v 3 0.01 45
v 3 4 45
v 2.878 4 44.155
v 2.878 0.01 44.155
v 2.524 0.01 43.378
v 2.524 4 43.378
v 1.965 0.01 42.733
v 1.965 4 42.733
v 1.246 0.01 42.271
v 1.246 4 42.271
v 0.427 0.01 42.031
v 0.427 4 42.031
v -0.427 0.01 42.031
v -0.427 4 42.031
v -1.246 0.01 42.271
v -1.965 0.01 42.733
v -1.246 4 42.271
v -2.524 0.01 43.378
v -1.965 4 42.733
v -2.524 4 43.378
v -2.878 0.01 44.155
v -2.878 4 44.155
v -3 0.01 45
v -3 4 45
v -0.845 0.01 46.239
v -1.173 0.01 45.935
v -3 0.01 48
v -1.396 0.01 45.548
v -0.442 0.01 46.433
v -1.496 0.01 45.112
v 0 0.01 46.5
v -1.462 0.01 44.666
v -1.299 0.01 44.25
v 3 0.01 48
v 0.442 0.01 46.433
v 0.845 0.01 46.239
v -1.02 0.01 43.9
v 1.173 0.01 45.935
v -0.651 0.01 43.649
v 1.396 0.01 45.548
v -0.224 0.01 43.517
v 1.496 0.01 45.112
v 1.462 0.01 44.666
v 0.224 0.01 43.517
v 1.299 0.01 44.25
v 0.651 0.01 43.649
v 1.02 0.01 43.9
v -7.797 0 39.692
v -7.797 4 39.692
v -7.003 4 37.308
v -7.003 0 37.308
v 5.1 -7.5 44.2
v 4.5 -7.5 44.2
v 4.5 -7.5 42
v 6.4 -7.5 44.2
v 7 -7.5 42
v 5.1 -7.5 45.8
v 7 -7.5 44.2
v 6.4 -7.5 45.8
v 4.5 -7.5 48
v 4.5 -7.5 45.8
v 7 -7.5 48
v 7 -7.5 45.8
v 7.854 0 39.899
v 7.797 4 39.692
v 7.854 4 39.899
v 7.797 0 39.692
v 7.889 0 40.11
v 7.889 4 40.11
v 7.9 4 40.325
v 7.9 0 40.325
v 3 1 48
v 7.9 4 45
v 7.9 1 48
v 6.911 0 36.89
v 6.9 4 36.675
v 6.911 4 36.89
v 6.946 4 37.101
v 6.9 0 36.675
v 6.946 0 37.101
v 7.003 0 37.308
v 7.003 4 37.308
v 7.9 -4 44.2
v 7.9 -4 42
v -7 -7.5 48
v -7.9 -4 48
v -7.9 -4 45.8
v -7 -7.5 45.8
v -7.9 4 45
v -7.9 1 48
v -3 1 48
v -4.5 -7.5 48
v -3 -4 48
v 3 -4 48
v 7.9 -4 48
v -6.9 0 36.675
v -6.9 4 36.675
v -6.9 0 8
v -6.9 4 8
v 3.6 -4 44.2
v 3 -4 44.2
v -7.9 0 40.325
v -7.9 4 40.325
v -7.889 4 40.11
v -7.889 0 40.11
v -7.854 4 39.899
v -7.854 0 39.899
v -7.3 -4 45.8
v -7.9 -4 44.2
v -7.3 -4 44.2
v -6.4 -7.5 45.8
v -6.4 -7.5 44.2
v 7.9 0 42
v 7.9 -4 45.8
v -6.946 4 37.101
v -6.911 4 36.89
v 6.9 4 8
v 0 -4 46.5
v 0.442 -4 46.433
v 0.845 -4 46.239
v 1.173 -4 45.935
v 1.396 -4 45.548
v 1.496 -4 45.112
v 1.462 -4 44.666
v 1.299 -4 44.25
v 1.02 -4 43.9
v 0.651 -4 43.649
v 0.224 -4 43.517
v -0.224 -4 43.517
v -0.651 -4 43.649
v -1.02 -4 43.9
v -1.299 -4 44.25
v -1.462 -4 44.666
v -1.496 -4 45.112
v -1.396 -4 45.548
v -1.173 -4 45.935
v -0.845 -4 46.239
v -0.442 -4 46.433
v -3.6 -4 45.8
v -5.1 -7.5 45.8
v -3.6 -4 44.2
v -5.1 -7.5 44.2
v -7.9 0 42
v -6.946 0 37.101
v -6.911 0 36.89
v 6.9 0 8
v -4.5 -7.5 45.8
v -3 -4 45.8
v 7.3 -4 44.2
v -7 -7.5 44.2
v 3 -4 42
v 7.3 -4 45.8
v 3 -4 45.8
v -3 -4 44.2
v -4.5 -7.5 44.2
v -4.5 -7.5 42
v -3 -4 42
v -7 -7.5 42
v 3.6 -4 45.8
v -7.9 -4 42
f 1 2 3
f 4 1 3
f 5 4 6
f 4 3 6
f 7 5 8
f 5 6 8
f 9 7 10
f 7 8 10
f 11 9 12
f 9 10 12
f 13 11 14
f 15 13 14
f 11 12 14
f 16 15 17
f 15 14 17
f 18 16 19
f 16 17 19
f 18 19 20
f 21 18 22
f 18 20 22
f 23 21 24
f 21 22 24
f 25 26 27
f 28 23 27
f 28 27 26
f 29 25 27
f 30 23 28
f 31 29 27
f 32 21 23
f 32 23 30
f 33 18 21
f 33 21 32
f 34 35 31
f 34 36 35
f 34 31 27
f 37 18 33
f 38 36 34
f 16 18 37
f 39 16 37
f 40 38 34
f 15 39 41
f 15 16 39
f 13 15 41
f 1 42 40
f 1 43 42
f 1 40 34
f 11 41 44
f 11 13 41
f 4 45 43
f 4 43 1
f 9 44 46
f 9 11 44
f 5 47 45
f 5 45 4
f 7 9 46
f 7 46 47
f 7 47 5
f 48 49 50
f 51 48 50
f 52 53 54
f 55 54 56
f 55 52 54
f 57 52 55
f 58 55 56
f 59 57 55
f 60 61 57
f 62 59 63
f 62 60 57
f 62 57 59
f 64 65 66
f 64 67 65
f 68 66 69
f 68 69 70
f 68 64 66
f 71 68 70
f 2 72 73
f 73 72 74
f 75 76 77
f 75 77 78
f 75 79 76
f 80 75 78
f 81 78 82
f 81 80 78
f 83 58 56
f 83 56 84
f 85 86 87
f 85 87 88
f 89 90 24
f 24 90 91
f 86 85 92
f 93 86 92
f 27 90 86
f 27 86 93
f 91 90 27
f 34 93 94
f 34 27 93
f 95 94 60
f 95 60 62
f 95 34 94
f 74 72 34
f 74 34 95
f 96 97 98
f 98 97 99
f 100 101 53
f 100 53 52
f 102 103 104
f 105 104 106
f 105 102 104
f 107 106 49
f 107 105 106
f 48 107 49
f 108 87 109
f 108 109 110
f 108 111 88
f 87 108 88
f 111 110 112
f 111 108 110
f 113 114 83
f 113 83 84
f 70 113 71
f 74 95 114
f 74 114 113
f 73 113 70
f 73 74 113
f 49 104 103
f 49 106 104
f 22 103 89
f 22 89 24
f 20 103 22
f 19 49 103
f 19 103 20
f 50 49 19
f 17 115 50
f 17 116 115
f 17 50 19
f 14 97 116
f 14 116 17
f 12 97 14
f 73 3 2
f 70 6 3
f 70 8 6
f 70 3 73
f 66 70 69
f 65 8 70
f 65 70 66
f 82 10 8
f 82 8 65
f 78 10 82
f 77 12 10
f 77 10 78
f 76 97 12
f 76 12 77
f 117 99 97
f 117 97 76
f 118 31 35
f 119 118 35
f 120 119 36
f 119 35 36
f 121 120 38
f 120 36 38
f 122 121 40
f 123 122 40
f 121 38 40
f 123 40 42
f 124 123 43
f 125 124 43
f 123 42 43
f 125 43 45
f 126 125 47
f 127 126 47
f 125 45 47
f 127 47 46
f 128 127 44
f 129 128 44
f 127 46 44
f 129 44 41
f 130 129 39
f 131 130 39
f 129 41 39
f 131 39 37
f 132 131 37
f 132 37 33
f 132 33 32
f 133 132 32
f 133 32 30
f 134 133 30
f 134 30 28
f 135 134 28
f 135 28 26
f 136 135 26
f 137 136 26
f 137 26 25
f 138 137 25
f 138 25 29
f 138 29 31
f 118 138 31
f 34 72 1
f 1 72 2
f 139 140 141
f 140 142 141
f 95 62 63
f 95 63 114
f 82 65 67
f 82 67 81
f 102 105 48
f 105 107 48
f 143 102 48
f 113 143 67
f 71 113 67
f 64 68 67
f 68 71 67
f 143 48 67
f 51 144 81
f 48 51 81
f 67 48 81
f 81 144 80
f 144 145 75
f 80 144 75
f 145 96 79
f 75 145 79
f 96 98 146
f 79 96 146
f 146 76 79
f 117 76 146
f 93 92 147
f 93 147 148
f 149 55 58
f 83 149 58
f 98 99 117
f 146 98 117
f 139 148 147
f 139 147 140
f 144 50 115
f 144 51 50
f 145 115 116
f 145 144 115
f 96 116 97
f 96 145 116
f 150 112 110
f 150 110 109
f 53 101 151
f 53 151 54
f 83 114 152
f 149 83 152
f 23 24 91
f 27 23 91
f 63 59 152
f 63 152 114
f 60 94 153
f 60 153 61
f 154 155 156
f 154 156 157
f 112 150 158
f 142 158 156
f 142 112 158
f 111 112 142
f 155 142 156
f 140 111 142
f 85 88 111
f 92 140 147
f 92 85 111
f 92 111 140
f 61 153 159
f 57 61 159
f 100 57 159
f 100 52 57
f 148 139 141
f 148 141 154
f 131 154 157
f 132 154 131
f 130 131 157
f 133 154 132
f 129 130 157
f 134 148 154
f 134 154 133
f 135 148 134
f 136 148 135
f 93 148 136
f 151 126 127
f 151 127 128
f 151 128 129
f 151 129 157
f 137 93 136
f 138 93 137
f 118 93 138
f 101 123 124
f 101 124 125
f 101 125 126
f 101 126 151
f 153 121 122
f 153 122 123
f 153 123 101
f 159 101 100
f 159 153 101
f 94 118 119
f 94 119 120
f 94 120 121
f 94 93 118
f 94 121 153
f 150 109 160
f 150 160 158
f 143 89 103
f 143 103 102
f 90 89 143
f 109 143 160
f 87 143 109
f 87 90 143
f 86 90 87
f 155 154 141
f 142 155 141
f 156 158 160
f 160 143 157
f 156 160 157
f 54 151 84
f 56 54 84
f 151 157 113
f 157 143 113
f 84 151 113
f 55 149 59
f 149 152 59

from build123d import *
from build123d.topology import SkipClean

# Parameters (mm, degrees)
EXTRUDE_1_DEPTH     = 4
EXTRUDE_3_DEPTH     = 6
CHAMFER_1_SIZE      = 3
CUT_EXTRUDE_2_DEPTH = 3.99
CUT_EXTRUDE_3_REACH = 51.222
SKETCH_7_R          = 1.5
SKETCH_8_R          = 6
EXTRUDE_4_DEPTH     = 1
FILLET_1_R          = 0.5
SKETCH_9_R          = 5
CUT_EXTRUDE_4_DEPTH = 3
SKETCH_10_R         = 3.55
CUT_EXTRUDE_5_DEPTH = 3.6
CUT_EXTRUDE_6_DEPTH = 0.8
CUT_EXTRUDE_7_DEPTH = 50.986598204
FILLET_2_R          = 2


with BuildPart() as part:
    # ｽｹｯﾁ1 → ﾎﾞｽ - 押し出し1 (new body)
    with BuildSketch(Plane(origin=(0, 0, 0), x_dir=(1, 0, 0), z_dir=(0, 1, 0))):
        with BuildLine():
            Line((-7.9, 0), (-7.9, -48))
            Line((-7.9, -48), (7.9, -48))
            Line((7.9, -48), (7.9, 0))
            ThreePointArc((7.9, 0), (0, 7.9), (-7.9, 0))
        make_face()
    extrude(amount=EXTRUDE_1_DEPTH)

    # ｽｹｯﾁ4 → ﾎﾞｽ - 押し出し3 (add)
    with BuildSketch(Plane.XY.offset(48)):
        Polygon((-7, -7.5), (-4.5, -7.5), (-3, -4), (3, -4), (4.5, -7.5), (7, -7.5), (7.9, -4), (7.9, 0), (-7.9, 0), (-7.9, -4), align=None)
    extrude(amount=-EXTRUDE_3_DEPTH)

    # 面取り1
    chamfer_1_edges = [part.edges().sort_by_distance(p)[0] for p in [
        (0, 4, 48),
    ]]
    chamfer(chamfer_1_edges, length=CHAMFER_1_SIZE)

    # ｽｹｯﾁ6 → ｶｯﾄ - 押し出し2 (cut)
    with BuildSketch(Plane(origin=(0, 4, 0), x_dir=(1, 0, 0), z_dir=(0, 1, 0))):
        with BuildLine():
            Line((-3, -45), (-3, -49))
            Line((-3, -49), (3, -49))
            Line((3, -49), (3, -45))
            ThreePointArc((3, -45), (0, -42), (-3, -45))
        make_face()
    extrude(amount=-CUT_EXTRUDE_2_DEPTH, mode=Mode.SUBTRACT)

    # ｽｹｯﾁ7 → ｶｯﾄ - 押し出し3 (cut, up to next)
    with BuildSketch(Plane(origin=(0, 0.01, 0), x_dir=(1, 0, 0), z_dir=(0, 1, 0)), mode=Mode.PRIVATE) as cut_extrude_3_sk1:
        with Locations(Location((0, -45, 0), (0, 0, 270))):
            Circle(SKETCH_7_R)
    cut_extrude_3_tool1 = extrude(cut_extrude_3_sk1.sketch, amount=-CUT_EXTRUDE_3_REACH, mode=Mode.PRIVATE) & part.part
    add(cut_extrude_3_tool1.solids().sort_by_distance((0, 0.01, 45))[0], mode=Mode.SUBTRACT)

    # ｽｹｯﾁ8 → ﾎﾞｽ - 押し出し4 (add)
    with BuildSketch(Plane.XZ):
        with Locations(Location((0, 0, 0), (0, 0, 90))):
            Circle(SKETCH_8_R)
    extrude(amount=EXTRUDE_4_DEPTH)

    # ﾌｨﾚｯﾄ1
    fillet_1_edges = [part.edges().sort_by_distance(p)[0] for p in [
        (0, 0, -6),
    ]]
    fillet(fillet_1_edges, radius=FILLET_1_R)

    # ｽｹｯﾁ9 → ｶｯﾄ - 押し出し4 (cut)
    with BuildSketch(Plane(origin=(0, 4, 0), x_dir=(1, 0, 0), z_dir=(0, 1, 0))):
        with Locations(Location((0, 0, 0), (0, 0, 270))):
            Circle(SKETCH_9_R)
    extrude(amount=-CUT_EXTRUDE_4_DEPTH, mode=Mode.SUBTRACT)

    # ｽｹｯﾁ10 → ｶｯﾄ - 押し出し5 (cut)
    with BuildSketch(Plane(origin=(0, 1, 0), x_dir=(1, 0, 0), z_dir=(0, 1, 0))):
        with Locations(Location((0, 0, 0), (0, 0, 270))):
            Circle(SKETCH_10_R)
    extrude(amount=-CUT_EXTRUDE_5_DEPTH, mode=Mode.SUBTRACT)

    # ｽｹｯﾁ11 → ｶｯﾄ - 押し出し6 (cut, symmetric)
    with BuildSketch(Plane.XY.offset(45)):
        Polygon((3, -4), (4.5, -7.5), (5.1, -7.5), (3.6, -4), align=None)
        Polygon((6.4, -7.5), (7, -7.5), (7.9, -4), (7.3, -4), align=None)
    cut_extrude_6 = extrude(amount=CUT_EXTRUDE_6_DEPTH, both=True, mode=Mode.SUBTRACT)

    # ﾐﾗｰ1: ｶｯﾄ - 押し出し6 across plane
    add(cut_extrude_6.mirror(Plane(origin=(0, 0, 0), x_dir=(0, 0, 1), z_dir=(1, 0, 0))), mode=Mode.SUBTRACT)

    # ｽｹｯﾁ12 → ｶｯﾄ - 押し出し7 (cut, through all)
    with SkipClean():  # the faces are left unmerged after this step: merging them gives an invalid solid
        with BuildSketch(Plane(origin=(0, 4, 0), x_dir=(1, 0, 0), z_dir=(0, 1, 0))):
            with BuildLine():
                Line((-7.9, 0), (-7.9, -40))
                Line((-7.9, -40), (-6.9, -37))
                Line((-6.9, -37), (-6.9, -3.847076812))
                ThreePointArc((-6.9, -3.847076812), (-7.645913941, -1.987460691), (-7.9, 0))
            make_face()
        cut_extrude_7 = extrude(amount=-CUT_EXTRUDE_7_DEPTH, mode=Mode.SUBTRACT)

    # ﾐﾗｰ2: ｶｯﾄ - 押し出し7 across plane
    with SkipClean():  # the faces are left unmerged after this step: merging them gives an invalid solid
        add(cut_extrude_7.mirror(Plane(origin=(0, 0, 0), x_dir=(0, 0, 1), z_dir=(1, 0, 0))), mode=Mode.SUBTRACT)

    # ﾌｨﾚｯﾄ2
    fillet_2_edges = [part.edges().sort_by_distance(p)[0] for p in [
        (-6.9, 2, 3.847076812),
        (-6.9, 2, 37),
        (-7.9, 2, 40),
        (6.9, 2, 3.847076812),
        (7.9, 2, 40),
        (6.9, 2, 37),
    ]]
    fillet(fillet_2_edges, radius=FILLET_2_R)

    # Surface Cut 1
    split(bisect_by=Plane.XY.offset(8), keep=Keep.TOP)


solid = part.part
